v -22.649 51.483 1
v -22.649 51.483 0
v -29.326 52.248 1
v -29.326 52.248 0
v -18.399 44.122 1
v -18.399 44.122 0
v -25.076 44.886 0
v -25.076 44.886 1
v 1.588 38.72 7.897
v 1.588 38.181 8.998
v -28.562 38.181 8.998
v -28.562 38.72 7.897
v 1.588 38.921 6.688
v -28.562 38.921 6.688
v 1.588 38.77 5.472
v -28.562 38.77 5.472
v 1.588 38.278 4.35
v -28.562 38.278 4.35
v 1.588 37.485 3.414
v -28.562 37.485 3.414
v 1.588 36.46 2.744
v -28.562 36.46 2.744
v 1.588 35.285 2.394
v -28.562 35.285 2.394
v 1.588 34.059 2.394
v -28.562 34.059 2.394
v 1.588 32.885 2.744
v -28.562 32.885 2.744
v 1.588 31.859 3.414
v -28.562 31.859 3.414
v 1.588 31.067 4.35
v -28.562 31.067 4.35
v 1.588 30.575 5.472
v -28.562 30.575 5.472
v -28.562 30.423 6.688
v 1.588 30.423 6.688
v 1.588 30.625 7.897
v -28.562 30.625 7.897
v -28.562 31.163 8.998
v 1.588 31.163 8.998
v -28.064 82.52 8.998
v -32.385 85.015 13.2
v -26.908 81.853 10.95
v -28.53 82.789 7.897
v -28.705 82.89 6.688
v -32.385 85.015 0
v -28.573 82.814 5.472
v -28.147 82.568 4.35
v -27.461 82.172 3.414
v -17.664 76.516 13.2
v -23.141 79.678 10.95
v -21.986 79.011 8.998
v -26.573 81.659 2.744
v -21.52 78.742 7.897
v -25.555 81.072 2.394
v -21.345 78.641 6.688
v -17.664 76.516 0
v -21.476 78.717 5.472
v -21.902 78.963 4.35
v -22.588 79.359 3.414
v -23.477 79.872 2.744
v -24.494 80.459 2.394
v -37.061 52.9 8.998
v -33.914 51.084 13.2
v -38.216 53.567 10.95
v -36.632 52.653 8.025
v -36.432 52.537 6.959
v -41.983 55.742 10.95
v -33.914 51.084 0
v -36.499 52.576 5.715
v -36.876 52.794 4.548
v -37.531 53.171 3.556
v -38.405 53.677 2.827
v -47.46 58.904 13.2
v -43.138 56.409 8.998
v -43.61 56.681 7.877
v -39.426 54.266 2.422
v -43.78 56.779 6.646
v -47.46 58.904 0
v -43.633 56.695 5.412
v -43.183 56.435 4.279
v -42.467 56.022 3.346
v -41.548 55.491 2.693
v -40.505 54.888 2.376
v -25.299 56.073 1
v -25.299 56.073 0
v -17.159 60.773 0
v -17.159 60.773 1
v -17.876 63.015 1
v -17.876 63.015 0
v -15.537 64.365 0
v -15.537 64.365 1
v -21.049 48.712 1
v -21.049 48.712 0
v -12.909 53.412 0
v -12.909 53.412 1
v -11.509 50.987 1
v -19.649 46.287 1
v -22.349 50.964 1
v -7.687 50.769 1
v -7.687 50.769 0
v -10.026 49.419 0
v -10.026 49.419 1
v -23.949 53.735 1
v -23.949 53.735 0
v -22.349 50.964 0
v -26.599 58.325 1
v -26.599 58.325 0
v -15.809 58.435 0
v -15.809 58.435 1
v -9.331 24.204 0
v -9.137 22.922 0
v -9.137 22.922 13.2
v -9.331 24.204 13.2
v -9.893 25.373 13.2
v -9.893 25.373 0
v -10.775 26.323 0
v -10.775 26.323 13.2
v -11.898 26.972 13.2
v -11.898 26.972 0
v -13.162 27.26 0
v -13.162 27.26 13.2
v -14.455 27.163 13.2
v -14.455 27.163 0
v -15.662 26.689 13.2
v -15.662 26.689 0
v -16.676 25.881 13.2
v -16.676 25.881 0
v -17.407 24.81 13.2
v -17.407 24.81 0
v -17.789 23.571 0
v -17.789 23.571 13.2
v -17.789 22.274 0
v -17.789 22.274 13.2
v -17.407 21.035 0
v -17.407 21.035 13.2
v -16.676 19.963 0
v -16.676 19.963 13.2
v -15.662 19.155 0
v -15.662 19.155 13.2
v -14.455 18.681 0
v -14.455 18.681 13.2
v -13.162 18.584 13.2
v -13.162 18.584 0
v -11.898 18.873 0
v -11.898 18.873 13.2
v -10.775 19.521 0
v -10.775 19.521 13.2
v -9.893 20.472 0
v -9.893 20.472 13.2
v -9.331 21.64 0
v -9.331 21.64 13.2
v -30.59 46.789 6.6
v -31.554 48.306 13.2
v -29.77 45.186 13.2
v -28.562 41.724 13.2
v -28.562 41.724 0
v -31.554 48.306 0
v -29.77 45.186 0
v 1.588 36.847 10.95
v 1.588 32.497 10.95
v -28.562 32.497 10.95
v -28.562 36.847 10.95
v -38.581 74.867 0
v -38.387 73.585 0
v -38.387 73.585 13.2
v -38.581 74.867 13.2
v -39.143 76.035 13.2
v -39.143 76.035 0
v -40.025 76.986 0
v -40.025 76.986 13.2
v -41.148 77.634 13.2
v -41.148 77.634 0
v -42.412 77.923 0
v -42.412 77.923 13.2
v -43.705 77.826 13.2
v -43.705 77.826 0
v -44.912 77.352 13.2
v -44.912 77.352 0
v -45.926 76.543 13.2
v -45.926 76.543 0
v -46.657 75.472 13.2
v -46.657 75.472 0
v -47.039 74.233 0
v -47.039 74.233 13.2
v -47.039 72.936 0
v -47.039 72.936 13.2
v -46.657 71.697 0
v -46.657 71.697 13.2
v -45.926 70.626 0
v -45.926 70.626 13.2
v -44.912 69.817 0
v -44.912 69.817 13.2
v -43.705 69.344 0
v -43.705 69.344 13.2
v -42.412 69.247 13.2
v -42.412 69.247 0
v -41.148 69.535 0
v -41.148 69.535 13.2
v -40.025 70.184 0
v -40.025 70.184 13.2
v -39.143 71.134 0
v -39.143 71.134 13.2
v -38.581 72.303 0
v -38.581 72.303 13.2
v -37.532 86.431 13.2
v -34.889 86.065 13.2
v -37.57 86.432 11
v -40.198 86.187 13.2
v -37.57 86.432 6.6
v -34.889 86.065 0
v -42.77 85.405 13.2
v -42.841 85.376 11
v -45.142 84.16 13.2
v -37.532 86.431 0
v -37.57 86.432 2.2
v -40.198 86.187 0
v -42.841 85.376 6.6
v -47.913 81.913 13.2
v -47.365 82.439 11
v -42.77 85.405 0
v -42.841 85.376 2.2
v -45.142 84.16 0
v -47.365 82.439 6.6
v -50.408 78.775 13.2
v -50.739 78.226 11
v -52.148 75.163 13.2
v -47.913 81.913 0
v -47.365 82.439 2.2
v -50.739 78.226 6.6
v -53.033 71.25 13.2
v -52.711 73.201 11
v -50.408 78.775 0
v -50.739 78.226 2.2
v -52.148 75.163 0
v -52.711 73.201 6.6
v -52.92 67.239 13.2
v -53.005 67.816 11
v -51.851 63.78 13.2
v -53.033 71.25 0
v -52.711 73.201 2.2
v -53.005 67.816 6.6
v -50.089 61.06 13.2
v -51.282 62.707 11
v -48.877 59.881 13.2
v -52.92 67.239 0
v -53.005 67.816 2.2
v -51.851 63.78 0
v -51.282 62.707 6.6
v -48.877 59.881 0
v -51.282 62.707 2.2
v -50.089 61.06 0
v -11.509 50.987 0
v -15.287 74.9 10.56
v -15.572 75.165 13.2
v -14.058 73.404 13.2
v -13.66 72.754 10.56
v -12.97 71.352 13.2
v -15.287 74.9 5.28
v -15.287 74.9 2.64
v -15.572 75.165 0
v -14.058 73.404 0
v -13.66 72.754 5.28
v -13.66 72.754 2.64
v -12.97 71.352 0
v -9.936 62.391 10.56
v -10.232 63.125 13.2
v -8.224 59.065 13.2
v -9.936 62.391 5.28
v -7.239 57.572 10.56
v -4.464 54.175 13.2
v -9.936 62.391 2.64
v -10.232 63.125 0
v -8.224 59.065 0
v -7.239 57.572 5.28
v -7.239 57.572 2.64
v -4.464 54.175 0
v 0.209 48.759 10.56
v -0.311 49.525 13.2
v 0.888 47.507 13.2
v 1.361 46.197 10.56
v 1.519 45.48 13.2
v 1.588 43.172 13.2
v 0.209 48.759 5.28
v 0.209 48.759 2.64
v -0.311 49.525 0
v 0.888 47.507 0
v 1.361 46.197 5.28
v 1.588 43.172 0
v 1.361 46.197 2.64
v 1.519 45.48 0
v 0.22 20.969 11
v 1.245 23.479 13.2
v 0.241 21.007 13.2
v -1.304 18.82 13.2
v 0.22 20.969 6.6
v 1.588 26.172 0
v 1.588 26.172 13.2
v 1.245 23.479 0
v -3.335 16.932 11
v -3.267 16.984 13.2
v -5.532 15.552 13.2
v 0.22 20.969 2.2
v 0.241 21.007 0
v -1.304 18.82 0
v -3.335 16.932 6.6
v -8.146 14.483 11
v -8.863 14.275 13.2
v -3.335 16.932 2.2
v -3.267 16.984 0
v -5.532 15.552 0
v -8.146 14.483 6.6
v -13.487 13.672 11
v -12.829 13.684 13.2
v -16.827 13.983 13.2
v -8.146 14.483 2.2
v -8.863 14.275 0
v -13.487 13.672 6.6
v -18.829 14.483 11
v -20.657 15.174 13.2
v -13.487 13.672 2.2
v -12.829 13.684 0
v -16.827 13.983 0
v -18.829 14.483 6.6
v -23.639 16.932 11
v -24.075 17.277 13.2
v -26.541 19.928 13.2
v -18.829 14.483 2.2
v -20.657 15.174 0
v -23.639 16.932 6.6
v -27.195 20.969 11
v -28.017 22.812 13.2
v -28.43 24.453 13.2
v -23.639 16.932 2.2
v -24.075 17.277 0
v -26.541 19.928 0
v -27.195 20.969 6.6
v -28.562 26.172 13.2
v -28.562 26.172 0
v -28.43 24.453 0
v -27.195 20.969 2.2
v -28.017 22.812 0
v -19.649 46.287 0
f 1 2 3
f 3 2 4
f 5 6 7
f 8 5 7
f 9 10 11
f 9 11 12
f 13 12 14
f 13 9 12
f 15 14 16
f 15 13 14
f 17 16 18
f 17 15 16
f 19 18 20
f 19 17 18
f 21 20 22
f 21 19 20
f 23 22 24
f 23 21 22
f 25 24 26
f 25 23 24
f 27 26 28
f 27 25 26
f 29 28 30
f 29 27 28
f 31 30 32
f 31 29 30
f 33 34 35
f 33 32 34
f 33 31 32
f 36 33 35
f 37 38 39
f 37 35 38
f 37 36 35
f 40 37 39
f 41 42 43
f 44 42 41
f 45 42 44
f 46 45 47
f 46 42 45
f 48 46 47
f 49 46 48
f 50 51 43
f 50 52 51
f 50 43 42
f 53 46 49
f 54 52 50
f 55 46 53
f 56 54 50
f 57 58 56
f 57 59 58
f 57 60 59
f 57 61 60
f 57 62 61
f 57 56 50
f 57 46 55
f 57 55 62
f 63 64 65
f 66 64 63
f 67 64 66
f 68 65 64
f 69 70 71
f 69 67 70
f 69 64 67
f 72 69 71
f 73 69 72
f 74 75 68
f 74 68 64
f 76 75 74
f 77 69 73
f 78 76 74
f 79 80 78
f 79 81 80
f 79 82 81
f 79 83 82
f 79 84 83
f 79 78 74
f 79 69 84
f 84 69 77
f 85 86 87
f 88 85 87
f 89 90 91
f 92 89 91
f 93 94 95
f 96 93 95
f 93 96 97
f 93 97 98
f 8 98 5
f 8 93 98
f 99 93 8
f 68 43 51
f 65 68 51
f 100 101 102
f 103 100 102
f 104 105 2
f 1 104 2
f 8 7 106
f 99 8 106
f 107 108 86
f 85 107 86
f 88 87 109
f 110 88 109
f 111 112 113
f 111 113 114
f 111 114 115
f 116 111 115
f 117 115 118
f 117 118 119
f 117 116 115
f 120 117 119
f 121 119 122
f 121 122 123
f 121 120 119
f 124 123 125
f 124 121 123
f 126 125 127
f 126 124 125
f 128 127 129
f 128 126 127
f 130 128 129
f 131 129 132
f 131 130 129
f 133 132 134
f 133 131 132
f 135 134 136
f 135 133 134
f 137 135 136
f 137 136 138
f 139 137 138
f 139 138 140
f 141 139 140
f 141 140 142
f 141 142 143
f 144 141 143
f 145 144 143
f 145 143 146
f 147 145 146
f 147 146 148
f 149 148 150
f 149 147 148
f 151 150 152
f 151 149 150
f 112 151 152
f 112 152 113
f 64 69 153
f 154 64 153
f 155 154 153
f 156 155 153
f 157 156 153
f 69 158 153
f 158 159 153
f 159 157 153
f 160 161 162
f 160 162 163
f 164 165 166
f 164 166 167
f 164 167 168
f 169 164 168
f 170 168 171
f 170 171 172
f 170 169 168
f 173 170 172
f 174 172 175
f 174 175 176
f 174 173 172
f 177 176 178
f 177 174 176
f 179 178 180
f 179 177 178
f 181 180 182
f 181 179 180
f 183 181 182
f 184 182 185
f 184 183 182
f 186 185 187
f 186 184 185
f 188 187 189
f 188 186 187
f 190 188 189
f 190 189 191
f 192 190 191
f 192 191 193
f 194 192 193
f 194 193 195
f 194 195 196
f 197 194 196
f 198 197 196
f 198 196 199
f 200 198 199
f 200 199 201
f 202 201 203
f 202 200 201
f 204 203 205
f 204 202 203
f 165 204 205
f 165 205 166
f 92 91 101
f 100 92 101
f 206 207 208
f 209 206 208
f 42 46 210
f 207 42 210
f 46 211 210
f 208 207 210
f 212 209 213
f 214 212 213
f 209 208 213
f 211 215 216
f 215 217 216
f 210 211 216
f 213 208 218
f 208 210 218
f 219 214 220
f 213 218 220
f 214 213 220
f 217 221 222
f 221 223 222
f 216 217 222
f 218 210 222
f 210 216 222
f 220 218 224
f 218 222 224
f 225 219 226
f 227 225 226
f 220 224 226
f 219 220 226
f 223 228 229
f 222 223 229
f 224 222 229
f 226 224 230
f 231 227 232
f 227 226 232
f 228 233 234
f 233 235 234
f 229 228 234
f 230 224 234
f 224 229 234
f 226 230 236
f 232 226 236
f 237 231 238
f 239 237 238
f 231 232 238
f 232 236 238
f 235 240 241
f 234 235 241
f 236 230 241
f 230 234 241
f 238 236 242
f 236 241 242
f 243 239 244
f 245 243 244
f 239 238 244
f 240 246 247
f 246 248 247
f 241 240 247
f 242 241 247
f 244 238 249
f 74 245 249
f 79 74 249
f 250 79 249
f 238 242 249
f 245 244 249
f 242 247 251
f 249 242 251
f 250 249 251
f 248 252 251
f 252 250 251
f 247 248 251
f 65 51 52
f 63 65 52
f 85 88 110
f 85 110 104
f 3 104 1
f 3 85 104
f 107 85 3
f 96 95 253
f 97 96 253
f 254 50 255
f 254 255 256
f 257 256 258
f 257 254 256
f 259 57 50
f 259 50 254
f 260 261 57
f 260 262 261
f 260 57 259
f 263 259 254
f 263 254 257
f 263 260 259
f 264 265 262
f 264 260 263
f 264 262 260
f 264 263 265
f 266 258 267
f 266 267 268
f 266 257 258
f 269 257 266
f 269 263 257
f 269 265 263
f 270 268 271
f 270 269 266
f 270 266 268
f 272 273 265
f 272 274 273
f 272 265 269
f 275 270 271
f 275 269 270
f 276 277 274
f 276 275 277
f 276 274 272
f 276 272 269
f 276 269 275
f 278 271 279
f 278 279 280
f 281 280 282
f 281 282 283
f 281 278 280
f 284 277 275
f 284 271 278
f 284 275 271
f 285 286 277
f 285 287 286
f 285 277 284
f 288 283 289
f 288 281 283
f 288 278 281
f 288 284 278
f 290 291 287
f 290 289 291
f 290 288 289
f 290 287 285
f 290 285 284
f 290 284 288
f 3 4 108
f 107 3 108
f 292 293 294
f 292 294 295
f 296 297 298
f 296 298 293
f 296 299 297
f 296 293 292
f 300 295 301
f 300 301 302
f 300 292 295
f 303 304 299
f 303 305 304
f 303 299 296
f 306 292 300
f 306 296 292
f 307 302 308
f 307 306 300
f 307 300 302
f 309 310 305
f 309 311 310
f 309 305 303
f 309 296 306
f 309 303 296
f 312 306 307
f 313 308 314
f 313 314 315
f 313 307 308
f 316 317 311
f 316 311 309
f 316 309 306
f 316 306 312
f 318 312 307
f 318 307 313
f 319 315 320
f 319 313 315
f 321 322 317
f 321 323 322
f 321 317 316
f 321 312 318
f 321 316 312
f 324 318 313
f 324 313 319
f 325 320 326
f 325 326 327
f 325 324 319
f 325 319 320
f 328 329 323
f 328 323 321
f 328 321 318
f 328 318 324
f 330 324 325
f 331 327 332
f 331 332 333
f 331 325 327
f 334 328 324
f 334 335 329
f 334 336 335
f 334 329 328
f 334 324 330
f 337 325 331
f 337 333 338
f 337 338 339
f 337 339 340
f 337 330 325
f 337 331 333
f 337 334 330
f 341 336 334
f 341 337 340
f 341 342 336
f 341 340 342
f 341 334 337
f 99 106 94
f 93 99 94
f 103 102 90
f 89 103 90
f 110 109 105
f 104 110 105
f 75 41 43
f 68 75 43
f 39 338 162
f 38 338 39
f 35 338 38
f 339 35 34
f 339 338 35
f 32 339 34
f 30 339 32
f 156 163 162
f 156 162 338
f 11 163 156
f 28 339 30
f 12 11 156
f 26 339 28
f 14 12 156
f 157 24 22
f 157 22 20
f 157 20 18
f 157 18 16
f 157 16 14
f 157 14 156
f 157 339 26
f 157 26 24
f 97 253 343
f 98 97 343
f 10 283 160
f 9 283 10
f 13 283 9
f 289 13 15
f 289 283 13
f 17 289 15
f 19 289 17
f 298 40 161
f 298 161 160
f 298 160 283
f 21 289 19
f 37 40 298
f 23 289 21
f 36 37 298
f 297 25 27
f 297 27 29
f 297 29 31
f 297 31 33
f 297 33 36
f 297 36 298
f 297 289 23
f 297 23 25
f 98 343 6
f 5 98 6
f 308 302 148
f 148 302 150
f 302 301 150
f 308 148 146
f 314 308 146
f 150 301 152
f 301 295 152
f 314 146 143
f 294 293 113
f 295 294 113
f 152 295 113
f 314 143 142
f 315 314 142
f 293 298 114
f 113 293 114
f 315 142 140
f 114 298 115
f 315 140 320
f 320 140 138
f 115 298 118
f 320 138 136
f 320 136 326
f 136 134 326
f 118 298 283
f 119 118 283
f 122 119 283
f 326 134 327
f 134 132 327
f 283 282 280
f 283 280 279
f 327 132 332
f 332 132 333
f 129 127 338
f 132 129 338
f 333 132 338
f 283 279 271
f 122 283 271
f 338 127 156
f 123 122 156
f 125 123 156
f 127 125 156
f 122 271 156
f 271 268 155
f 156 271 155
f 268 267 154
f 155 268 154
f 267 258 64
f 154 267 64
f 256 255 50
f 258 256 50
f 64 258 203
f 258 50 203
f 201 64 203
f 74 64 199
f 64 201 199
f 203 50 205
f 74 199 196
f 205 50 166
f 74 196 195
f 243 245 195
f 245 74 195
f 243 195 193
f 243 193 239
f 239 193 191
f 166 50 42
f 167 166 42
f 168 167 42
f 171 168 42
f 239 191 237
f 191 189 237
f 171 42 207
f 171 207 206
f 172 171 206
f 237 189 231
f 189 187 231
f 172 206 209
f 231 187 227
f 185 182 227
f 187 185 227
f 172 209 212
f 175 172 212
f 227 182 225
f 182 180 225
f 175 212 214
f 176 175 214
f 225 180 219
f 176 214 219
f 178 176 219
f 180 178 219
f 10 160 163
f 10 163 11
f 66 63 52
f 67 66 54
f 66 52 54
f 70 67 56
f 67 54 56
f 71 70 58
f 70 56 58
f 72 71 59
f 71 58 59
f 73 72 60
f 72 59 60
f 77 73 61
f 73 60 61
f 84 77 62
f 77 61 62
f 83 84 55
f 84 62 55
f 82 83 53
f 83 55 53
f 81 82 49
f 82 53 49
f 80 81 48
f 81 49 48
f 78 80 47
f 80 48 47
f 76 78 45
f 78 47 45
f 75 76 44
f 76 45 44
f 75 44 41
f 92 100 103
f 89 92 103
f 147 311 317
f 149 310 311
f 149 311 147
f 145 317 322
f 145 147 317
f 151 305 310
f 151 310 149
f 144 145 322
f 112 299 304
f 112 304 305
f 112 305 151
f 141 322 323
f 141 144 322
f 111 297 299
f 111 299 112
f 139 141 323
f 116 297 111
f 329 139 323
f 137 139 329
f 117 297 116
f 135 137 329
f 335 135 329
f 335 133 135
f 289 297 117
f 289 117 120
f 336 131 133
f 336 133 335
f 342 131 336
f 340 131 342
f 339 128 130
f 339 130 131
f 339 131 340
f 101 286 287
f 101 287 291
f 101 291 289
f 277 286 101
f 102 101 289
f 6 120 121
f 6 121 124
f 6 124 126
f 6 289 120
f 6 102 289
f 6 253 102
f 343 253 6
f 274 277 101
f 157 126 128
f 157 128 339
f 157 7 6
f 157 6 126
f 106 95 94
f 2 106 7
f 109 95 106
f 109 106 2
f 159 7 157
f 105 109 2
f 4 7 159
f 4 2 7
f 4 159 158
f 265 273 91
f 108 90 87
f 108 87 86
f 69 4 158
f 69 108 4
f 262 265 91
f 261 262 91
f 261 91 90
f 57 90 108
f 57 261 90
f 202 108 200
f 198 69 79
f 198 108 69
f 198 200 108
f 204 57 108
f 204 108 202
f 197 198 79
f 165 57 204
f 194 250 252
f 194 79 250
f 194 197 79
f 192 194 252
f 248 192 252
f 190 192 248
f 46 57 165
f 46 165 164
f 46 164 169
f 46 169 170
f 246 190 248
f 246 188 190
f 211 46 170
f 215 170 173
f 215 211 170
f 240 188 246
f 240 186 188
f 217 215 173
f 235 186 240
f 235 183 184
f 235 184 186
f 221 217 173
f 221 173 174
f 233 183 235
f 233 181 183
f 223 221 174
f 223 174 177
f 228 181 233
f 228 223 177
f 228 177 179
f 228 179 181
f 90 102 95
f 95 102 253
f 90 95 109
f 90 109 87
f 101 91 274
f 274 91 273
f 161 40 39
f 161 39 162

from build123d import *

# Parameters (mm, degrees)
MODEL_R               = 4.350000706
MODEL_R_2             = 4.349999799
MAIN_BODY_DEPTH       = 13.2
SIDE_UP_GRAPHIC_DEPTH = 1
HOLE_1_REACH          = 105.138
HOLE_2_REACH          = 92.65


with BuildPart() as part:
    # Model → Main body (new body)
    with BuildSketch(Plane.XY):
        with BuildLine():
            Line((-32.385278451, 85.015032789), (-17.6641047, 76.515992185))
            add(Edge.make_bspline(
                [(-17.6641047, 76.515992185), (-13.888722486, 74.796310284), (-12.180872386, 69.346040832), (-10.138677855, 62.322648799), (-7.341971962, 57.370319929), (-2.311165044, 51.709551581), (2.051636145, 47.586423037), (1.587639106, 43.172213575)],
                knots=[0, 0, 0, 0, 0.279425433, 0.41981198, 0.560237256, 0.707310001, 1, 1, 1, 1], degree=3))
            Line((1.587639106, 43.172213575), (1.587638631, 26.172213575))
            add(Edge.make_bspline(
                [(1.587638631, 26.172213575), (1.626935513, 22.433749487), (-1.504300665, 17.452795295), (-8.065829548, 14.211603151), (-13.487361838, 13.402379484), (-18.908893689, 14.211603727), (-25.470424367, 17.452793212), (-28.601657646, 22.43375075), (-28.56236242, 26.172213575)],
                knots=[0, 0, 0, 0, 0.249525848, 0.374711548, 0.499999996, 0.625288445, 0.750474147, 1, 1, 1, 1], degree=3))
            Line((-28.56236242, 26.172213575), (-28.56236242, 41.723666211))
            add(Edge.make_bspline(
                [(-33.914159524, 51.083510419), (-29.942183369, 47.173551609), (-28.56236242, 41.723666211)],
                knots=[0, 0, 0, 1, 1, 1], degree=2))
            Line((-33.914159524, 51.083510419), (-47.460258007, 58.904368421))
            add(Edge.make_bspline(
                [(-32.385278451, 85.015032789), (-35.600190369, 86.916553219), (-41.474036655, 86.698356276), (-47.559386008, 82.644557032), (-50.972092804, 78.360730829), (-52.985254476, 73.268128205), (-53.475705817, 65.95976879), (-50.710025567, 60.754293561), (-47.460258007, 58.904368421)],
                knots=[0, 0, 0, 0, 0.249337779, 0.374428166, 0.499621296, 0.624814359, 0.749906039, 1, 1, 1, 1], degree=3))
        make_face()
        with Locations((-13.487362418, 22.922213336)):
            Circle(MODEL_R, mode=Mode.SUBTRACT)
        with Locations((-42.737362401, 73.584699743)):
            Circle(MODEL_R_2, mode=Mode.SUBTRACT)
    extrude(amount=MAIN_BODY_DEPTH)

    # Model<4> → Side up graphic (cut)
    with BuildSketch(Plane.XY):
        Polygon((-23.949281442, 53.735095044), (-15.80864309, 58.435095807), (-17.1586416, 60.773364149), (-25.299281823, 56.073363324), (-26.59928106, 58.325030347), (-29.325818765, 52.247530958), (-22.649282205, 51.483428022), align=None)
        Polygon((-25.075818765, 44.886315366), (-18.399280297, 44.122214338), (-19.649280297, 46.287276288), (-11.508643853, 50.987277051), (-12.9086416, 53.412150465), (-21.049281823, 48.71214964), (-22.34928106, 50.963812848), align=None)
        Polygon((-10.0256307, 49.418623945), (-7.68736242, 50.768622419), (-15.537360894, 64.365221998), (-17.875629174, 63.015223523), align=None)
    extrude(amount=SIDE_UP_GRAPHIC_DEPTH, mode=Mode.SUBTRACT)

    # Schizzo3 → Hole 1 (cut, up to next)
    with BuildSketch(Plane(origin=(1.587637901, -4.4e-08, 0), x_dir=(0, 0, -1), z_dir=(0.9999999999999997, -2.789602577989315e-08, 0)), mode=Mode.PRIVATE) as hole_1_sk1:
        with BuildLine():
            Line((-10.95, 32.497213619), (-10.95, 36.847213619))
            Line((-10.95, 36.847213619), (-8.99780105, 38.181209219))
            ThreePointArc((-8.99780105, 38.181209219), (-2.35, 34.672213619), (-8.99780105, 31.163218019))
            Line((-8.99780105, 31.163218019), (-10.95, 32.497213619))
        make_face()
    hole_1_tool1 = extrude(hole_1_sk1.sketch, amount=-HOLE_1_REACH, mode=Mode.PRIVATE) & part.part
    add(hole_1_tool1.solids().sort_by_distance((1.587639, 34.672214, 6.73262))[0], mode=Mode.SUBTRACT)

    # Schizzo4 → Hole 2 (cut, up to next)
    with BuildSketch(Plane(origin=(28.716097743, 49.739103981, 0), x_dir=(0.8660313397108585, -0.499989718532907, 0), z_dir=(0.49998971853290697, 0.8660313397108584, 0)), mode=Mode.PRIVATE) as hole_2_sk1:
        with BuildLine():
            Line((-64.229093026, -10.95), (-59.879093026, -10.95))
            Line((-59.879093026, -10.95), (-58.545097426, -8.99780105))
            ThreePointArc((-58.545097426, -8.99780105), (-62.054093026, -2.35), (-65.563088627, -8.99780105))
            Line((-65.563088627, -8.99780105), (-64.229093026, -10.95))
        make_face()
    hole_2_tool1 = extrude(hole_2_sk1.sketch, amount=-HOLE_2_REACH, mode=Mode.PRIVATE) & part.part
    add(hole_2_tool1.solids().sort_by_distance((-25.024692, 80.765512, 6.73262))[0], mode=Mode.SUBTRACT)


solid = part.part
